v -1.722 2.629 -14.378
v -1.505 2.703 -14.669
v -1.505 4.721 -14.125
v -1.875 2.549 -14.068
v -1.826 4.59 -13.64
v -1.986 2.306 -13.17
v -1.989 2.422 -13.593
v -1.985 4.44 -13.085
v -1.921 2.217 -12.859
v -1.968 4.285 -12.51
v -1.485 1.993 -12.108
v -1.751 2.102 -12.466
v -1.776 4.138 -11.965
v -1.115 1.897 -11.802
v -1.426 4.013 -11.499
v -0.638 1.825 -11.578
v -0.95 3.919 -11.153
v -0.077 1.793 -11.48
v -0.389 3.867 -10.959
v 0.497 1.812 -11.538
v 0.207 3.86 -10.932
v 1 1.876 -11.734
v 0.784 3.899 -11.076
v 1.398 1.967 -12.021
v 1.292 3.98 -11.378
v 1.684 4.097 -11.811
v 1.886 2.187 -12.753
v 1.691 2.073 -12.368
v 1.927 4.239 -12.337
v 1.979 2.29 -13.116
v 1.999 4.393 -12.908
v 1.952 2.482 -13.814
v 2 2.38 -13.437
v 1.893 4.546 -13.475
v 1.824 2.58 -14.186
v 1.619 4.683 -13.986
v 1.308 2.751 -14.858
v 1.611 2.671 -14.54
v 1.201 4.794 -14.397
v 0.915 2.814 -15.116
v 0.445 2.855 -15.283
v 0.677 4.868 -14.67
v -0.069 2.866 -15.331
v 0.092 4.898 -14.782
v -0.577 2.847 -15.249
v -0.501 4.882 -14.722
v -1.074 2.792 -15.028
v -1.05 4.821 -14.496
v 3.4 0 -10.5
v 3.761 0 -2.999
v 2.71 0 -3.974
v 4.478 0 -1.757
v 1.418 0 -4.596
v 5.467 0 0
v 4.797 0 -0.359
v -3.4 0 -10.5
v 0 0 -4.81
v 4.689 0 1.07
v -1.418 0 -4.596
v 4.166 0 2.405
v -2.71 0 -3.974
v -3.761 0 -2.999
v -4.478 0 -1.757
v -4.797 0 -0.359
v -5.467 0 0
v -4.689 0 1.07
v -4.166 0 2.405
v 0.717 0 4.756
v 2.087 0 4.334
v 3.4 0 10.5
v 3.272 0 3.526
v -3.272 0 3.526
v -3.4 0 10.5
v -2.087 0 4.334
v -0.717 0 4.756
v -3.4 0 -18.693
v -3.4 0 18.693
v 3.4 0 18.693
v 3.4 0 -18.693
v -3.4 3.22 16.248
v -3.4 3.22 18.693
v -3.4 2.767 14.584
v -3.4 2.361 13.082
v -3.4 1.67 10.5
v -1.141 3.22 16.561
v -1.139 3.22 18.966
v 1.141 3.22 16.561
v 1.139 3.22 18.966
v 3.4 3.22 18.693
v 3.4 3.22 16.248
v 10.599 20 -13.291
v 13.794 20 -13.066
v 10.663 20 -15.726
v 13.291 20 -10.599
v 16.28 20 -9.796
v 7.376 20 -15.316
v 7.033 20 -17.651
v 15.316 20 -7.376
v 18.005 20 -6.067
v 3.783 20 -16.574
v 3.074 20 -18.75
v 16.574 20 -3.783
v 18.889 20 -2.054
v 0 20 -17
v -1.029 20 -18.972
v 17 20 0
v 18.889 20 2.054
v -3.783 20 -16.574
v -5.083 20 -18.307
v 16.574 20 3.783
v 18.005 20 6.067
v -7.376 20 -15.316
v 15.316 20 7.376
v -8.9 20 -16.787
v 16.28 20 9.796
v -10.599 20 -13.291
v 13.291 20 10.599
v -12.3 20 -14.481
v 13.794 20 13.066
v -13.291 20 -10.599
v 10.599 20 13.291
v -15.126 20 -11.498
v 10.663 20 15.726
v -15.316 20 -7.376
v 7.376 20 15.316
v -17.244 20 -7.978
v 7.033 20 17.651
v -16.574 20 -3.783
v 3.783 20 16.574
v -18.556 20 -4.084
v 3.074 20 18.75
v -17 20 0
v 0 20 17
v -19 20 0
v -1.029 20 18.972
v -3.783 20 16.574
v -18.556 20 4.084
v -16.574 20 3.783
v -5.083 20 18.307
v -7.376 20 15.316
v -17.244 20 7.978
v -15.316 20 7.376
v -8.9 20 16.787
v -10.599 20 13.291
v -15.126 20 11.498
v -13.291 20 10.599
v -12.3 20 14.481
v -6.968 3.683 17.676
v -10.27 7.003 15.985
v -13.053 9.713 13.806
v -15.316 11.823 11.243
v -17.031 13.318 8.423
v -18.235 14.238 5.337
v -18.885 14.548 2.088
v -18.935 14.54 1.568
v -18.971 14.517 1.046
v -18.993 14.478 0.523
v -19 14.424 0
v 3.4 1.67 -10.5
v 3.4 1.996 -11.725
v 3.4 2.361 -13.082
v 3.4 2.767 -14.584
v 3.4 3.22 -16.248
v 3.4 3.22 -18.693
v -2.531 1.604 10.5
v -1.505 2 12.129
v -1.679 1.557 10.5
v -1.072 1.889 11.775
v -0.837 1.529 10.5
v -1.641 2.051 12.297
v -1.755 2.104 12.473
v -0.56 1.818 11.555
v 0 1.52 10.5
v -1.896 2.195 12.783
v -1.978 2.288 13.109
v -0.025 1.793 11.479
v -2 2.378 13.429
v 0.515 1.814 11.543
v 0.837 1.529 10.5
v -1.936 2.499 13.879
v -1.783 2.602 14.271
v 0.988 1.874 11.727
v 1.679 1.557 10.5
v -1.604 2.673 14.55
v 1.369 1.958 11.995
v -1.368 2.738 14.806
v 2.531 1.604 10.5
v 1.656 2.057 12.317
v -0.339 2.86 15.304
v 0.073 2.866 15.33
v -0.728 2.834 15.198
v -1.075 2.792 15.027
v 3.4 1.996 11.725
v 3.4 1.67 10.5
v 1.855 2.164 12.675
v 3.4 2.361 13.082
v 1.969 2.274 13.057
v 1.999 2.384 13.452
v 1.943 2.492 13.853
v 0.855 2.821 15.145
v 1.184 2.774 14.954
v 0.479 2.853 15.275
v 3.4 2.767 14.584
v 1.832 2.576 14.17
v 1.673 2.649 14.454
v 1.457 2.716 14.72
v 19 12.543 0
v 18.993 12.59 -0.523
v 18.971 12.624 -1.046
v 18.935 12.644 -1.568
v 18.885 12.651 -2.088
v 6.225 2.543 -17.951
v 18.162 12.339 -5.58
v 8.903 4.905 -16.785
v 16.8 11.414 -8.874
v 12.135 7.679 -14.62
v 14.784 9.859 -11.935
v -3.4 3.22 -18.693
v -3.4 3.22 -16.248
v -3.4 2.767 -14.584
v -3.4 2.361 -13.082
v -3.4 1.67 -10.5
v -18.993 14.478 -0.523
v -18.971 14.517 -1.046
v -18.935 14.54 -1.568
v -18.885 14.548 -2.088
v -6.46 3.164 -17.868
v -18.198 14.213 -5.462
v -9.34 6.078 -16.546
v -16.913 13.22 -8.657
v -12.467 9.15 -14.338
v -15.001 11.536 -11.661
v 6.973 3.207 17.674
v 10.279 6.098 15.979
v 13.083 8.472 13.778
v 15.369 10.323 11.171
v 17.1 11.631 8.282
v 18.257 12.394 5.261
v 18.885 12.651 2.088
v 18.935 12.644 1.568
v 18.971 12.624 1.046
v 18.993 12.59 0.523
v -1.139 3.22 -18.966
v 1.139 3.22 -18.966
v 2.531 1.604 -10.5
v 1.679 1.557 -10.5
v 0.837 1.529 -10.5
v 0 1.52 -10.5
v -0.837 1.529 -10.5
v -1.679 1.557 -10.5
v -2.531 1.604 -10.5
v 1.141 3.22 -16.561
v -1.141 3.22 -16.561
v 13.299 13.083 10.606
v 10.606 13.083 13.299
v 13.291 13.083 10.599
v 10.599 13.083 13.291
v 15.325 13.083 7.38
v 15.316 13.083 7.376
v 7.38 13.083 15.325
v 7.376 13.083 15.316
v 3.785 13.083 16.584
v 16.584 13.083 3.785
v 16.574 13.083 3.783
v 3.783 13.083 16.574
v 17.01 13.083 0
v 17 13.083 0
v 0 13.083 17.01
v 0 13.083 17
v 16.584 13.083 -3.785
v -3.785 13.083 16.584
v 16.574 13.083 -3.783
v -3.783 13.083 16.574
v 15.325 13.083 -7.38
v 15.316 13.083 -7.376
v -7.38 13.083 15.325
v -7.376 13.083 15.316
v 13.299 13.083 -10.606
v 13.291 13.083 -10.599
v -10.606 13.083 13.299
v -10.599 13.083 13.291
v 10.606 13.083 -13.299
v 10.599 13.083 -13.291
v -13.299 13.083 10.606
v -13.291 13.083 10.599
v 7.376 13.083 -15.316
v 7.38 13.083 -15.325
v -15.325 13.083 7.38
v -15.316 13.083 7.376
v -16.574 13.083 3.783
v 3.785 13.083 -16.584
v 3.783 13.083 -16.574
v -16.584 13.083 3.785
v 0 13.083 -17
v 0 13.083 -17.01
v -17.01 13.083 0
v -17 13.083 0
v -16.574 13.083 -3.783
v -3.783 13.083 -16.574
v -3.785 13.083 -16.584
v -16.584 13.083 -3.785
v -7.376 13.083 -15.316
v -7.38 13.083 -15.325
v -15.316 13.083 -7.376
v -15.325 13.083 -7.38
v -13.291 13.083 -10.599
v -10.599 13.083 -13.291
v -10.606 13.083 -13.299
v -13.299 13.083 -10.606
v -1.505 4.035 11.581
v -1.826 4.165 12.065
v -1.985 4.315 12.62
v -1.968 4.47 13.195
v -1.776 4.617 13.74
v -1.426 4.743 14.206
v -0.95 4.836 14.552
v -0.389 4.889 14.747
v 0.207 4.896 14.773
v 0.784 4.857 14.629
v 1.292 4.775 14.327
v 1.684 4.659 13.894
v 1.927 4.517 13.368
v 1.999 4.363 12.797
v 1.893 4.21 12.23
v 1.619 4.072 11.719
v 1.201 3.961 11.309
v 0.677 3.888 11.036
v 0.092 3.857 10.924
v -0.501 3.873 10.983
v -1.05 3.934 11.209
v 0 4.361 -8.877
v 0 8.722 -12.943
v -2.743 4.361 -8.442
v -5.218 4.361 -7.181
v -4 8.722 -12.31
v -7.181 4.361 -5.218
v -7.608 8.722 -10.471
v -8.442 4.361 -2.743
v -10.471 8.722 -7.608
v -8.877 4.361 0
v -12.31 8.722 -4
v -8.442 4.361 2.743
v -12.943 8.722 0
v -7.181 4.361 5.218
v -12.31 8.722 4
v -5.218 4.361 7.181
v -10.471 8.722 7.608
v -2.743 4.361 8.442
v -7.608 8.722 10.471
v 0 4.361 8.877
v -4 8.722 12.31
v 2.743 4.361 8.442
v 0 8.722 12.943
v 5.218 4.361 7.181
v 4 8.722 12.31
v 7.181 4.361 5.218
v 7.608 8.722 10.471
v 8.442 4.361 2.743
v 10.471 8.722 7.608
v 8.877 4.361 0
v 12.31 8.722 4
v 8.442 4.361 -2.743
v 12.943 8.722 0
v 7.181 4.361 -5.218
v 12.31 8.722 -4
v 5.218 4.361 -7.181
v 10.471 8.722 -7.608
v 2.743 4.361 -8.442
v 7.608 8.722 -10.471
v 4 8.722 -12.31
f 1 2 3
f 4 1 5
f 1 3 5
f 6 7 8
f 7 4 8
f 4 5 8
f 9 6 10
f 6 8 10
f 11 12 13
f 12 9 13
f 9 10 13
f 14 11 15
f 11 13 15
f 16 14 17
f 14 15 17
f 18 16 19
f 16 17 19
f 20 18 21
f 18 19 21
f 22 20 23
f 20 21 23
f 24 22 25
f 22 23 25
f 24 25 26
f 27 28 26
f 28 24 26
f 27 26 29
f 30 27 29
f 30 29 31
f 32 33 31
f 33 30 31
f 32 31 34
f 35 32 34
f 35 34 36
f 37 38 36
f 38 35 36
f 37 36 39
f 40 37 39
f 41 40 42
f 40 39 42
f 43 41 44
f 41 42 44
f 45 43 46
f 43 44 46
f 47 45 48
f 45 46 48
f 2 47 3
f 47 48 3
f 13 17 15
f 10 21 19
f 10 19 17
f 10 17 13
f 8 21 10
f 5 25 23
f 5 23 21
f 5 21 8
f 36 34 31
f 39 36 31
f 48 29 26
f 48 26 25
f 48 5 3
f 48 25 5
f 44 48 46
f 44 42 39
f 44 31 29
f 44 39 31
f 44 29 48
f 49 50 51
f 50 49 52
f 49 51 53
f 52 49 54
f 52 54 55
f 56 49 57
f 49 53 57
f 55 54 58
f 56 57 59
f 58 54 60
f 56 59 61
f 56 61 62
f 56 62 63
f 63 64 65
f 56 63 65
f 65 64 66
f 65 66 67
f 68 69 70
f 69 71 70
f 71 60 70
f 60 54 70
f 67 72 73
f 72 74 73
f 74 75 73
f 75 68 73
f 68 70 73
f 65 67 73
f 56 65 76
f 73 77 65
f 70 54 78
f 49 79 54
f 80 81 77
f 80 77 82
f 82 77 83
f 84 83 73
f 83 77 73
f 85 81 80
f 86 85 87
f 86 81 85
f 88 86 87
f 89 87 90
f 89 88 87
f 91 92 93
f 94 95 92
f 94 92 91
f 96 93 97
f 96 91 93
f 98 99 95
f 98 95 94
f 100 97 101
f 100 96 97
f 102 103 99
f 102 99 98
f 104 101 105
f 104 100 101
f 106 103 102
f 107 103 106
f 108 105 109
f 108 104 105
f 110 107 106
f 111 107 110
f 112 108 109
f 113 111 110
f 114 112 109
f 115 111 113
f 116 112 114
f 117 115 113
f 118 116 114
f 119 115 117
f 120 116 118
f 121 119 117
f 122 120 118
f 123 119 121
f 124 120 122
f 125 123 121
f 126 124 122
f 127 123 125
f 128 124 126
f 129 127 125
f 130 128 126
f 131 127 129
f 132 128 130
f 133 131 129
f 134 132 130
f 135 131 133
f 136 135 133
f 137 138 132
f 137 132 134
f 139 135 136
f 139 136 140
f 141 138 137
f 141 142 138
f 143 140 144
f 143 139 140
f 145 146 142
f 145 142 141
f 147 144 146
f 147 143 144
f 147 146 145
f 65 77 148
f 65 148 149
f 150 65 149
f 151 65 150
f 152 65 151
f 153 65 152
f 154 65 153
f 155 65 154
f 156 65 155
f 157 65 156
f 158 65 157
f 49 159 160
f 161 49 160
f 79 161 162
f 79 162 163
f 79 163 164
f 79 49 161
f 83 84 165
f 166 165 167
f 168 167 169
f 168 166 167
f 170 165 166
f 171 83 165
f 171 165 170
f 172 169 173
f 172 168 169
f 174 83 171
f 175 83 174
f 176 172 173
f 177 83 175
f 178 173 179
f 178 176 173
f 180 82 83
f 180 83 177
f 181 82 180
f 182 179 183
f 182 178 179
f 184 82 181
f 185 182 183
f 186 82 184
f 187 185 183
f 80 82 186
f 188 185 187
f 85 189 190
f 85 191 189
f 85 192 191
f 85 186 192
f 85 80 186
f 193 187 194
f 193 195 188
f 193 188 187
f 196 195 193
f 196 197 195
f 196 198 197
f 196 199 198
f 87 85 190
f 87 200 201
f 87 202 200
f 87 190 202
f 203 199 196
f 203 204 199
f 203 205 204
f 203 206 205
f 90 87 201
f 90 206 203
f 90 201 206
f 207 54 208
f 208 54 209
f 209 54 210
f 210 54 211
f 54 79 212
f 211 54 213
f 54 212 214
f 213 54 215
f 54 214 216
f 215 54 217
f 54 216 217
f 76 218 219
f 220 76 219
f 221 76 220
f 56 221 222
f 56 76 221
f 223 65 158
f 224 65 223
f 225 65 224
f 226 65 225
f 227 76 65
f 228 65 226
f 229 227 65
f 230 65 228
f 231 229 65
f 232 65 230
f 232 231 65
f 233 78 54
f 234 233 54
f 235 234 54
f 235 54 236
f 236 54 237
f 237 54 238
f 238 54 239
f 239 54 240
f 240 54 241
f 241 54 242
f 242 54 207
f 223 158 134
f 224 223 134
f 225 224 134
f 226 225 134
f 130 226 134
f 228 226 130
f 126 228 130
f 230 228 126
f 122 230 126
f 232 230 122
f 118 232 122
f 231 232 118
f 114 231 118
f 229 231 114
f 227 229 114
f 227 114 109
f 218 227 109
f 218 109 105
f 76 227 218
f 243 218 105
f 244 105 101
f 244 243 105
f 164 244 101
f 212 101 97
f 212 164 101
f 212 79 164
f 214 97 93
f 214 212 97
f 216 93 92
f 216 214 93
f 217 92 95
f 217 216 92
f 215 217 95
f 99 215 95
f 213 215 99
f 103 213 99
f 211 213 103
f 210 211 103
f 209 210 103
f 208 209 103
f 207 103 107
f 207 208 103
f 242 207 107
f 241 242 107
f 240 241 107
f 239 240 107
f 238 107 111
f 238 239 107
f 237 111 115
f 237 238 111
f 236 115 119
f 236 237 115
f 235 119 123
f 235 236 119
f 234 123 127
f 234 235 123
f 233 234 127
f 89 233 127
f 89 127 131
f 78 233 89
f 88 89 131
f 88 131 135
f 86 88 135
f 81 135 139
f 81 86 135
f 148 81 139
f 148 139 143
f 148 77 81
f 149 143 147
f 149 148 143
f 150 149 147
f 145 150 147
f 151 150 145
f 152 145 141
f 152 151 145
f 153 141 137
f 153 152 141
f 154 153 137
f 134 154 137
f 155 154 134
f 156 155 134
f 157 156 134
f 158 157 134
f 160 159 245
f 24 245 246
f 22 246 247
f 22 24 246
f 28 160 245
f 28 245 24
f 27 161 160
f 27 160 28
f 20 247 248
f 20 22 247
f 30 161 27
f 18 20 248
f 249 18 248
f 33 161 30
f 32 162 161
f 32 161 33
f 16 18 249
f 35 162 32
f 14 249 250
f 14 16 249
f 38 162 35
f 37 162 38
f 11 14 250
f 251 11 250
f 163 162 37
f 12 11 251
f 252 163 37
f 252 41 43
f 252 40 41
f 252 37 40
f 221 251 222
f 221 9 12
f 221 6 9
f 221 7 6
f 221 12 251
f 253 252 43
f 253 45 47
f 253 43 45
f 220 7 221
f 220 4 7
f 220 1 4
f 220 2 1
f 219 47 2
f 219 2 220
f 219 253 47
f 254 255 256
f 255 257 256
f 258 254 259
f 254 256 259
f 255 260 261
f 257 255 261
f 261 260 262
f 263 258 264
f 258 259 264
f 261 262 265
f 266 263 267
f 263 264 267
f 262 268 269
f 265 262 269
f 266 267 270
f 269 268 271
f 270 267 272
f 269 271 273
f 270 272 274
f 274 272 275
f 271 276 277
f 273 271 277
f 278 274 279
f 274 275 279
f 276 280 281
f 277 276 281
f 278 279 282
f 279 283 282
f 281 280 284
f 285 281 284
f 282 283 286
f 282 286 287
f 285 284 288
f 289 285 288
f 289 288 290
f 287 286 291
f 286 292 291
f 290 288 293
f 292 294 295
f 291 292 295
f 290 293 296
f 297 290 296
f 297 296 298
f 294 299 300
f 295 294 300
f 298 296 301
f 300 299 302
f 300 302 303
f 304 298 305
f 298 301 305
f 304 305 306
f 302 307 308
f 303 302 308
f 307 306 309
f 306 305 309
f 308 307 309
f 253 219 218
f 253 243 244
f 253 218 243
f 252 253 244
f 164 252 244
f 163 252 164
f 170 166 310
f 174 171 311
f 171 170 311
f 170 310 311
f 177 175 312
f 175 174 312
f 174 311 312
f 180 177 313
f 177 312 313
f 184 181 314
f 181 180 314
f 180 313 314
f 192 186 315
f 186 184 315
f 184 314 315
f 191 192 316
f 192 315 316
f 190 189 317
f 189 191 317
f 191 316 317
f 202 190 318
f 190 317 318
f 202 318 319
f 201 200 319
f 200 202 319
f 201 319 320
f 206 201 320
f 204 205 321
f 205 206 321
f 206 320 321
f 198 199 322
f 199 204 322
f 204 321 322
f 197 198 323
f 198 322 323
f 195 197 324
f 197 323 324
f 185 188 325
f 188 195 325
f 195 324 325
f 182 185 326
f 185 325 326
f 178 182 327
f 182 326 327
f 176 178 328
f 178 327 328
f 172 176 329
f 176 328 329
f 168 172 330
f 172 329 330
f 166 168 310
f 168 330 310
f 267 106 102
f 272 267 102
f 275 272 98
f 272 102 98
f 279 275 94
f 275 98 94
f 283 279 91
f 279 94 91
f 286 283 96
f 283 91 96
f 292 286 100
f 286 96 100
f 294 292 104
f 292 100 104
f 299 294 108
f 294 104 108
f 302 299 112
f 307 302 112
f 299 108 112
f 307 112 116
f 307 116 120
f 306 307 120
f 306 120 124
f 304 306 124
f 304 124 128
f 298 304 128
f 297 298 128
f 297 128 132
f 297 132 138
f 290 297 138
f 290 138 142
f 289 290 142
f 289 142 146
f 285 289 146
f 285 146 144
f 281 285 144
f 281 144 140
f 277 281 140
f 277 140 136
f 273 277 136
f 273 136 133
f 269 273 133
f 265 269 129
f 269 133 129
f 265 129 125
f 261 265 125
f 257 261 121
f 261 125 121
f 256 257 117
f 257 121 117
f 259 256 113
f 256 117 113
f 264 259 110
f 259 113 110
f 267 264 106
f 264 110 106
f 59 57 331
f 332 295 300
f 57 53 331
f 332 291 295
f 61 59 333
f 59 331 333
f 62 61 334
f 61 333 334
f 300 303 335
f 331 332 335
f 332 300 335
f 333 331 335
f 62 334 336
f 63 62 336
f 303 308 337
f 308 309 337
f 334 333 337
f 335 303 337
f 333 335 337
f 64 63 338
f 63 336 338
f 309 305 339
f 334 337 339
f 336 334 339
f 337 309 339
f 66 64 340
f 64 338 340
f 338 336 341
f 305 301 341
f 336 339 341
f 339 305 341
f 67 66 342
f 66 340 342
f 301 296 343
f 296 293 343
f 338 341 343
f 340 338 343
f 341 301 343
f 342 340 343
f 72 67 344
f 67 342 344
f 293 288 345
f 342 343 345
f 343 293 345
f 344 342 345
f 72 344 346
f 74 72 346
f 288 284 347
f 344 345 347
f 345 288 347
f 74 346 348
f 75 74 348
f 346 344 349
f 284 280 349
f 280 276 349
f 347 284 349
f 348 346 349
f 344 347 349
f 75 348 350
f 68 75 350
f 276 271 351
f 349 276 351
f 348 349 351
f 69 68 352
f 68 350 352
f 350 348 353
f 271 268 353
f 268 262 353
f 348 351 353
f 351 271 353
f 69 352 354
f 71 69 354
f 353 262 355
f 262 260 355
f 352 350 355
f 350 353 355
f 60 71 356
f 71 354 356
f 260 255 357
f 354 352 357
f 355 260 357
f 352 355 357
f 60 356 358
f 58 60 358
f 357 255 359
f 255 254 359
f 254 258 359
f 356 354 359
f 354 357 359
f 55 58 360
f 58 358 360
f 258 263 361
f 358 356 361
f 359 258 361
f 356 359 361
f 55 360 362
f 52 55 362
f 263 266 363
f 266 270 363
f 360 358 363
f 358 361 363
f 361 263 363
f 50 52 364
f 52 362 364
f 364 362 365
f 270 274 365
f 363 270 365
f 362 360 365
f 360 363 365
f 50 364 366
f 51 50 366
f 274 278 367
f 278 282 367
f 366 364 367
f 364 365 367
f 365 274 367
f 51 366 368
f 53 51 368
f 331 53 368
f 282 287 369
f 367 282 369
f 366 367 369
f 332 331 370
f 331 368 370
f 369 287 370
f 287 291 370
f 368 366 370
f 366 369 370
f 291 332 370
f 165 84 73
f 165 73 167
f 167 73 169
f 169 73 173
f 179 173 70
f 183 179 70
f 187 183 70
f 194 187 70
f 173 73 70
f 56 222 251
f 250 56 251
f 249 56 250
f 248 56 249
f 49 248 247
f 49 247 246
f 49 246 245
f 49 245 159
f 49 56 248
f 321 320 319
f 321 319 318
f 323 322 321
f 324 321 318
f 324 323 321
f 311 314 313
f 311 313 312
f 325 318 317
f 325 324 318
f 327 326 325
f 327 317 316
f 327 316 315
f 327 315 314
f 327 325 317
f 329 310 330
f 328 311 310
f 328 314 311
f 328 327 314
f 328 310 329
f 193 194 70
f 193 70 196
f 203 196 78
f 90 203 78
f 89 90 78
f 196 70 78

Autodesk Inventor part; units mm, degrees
ref_plane "YZ Plane" through (0, 0, 0) normal (1, 0, 0) x (0, 1, 0)
sketch "Sketch1" plane through (0, 0, 0) normal (0, 1, 0) x (-1, 0, 0)
  circle A0 centre (0, 0) radius 19
  dimension "d0" = 38
extrude "Extrusion1" add sketch "Sketch1" along normal blind 20
sketch "Sketch2" plane through (0, 0, 0) normal (0, -1, 0) x (1, 0, 0)
  line L0 (0, -10.5) -> (3.4, -10.5)
  line L1 (3.4, -10.5) -> (3.4, -19)
  line L2 (3.4, -19) -> (0, -19)
  line L3 (0, -19) -> (-3.4, -19)
  line L4 (-3.4, -19) -> (-3.4, -10.5)
  line L5 (-3.4, -10.5) -> (0, -10.5)
  point P0 (0, 0)
  dimension "d3" = 10.5
  dimension "d5" = 8.5
  dimension "d113" = 3.4
  dimension "d114" = 3.4
sketch "Sketch3" plane through (0, 0, 0) normal (0, -1, 0) x (1, 0, 0)
  line L0 (0.251, 10.5) -> (3.4, 10.5)
  line L1 (3.4, 10.5) -> (3.4, 19)
  line L2 (3.4, 19) -> (-0.351, 19)
  line L3 (-0.351, 19) -> (-3.4, 19)
  line L4 (-3.4, 19) -> (-3.4, 10.5)
  line L5 (-3.4, 10.5) -> (0.251, 10.5)
  point P0 (0, 0)
  dimension "d22" = 8.5
  dimension "d106" = 10.5
  dimension "d107" = 3.4
  dimension "d110" = 3.4
extrude "Extrusion2" cut sketch "Sketch3" against normal blind 3.22
extrude "Extrusion3" cut sketch "Sketch2" against normal blind 3.22
sketch "Sketch4" plane through (0, 0, 0) normal (1, 0, 0) x (0, 1, 0)
  line L0 (0, -10.5) -> (3.22, -10.5) projected
  line L1 (3.22, -10.5) -> (3.22, -16.6)
  line L2 (3.22, -10.5) -> (3.22, -18.6933) projected
  line L3 (3.22, -16.6) -> (3.22, -10.5)
  line L4 (3.22, -10.5) -> (1.52, -10.5)
  line L5 (1.52, -10.5) -> (3.22, -16.6)
  line L6 (-0.644, 0) -> (3.864, 0) projected
  point P0 (0, 0)
  dimension "d28" = 6.1
  dimension "d29" = 1.7
revolve "Revolution1" add sketch "Sketch4" angle 360 about axis through (0, -10, 0) along (0, 1, 0)
sketch "Sketch5" plane through (0, 20, 0) normal (0, 1, 0) x (1, 0, 0)
  circle A0 centre (0, 0) radius 4.81
  dimension "d31" = 9.62
extrude "Extrusion4" cut sketch "Sketch5" against normal through all
sketch "Sketch6" plane through (0, 0, 0) normal (1, 0, 0) x (0, 1, 0)
  line L0 (0, -4.81) -> (13.0829, -17.01)
  line L1 (20, -19) -> (20, 19) projected
  line L2 (13.0829, -4.81) -> (0, -4.81)
  line L3 (-2.6166, 0) -> (15.6995, 0) projected
  line L4 (13.0829, -4.81) -> (13.0829, -17.01)
  line L5 (3.22, -19) -> (20, -19) projected
  line L6 (0, -4.81) -> (13.0829, -4.81) construction
  point P0 (0, 0)
  point P1 (20, -4.81)
  point P2 (13.0829, -17.01)
  dimension "d85" = 12.2
  dimension "d90" = 13.0829
revolve "Revolution2" cut sketch "Sketch6" angle 360 about axis through (0, -10, 0) along (0, 1, 0)
ref_plane "Work Plane1" through (3.4, 3.22, 16.2481) normal (0, -0.9654954, 0.2604203) x (-0.7523847, -0.1715451, -0.6359949)
sketch "Sketch10" plane through (3.4, 3.22, 16.2481) normal (0, -0.9654954, 0.2604203) x (-0.7523847, -0.1715451, -0.6359949)
  line L0 (9.3243, 0.3271) -> (9.0379, 0) projected
  line L1 (-1.5552, -1.7763) -> (0, 0) projected
  line L2 (9.0379, 0) -> (0, 0)
  circle A0 centre (4.519, 0) radius 2
  point P0 (13.4442, 10.1942)
  dimension "d111" = 4
extrude "Extrusion5" cut sketch "Sketch10" along normal mid plane 4
ref_plane "Work Plane4" through (3.4, 1.6696, -10.5) normal (0, -0.9654954, -0.2604203) x (-0.7523847, 0.1715451, -0.6359949)
sketch "Sketch12" plane through (3.4, 1.6696, -10.5) normal (0, -0.9654954, -0.2604203) x (-0.7523847, 0.1715451, -0.6359949)
  line L0 (-0.2864, -0.3271) -> (0, 0) projected
  ellipse E0 centre (-3.8539, -9.5633) end of major axis (8.6357, -20.4981) minor radius 16.0272 (9.0379, 0) -> (3.9217, 4.4793) ccw projected
  line L1 (0, 0) -> (3.9217, 4.4793)
  line L2 (4.8298, -4.8065) -> (5.1162, -4.4793) projected
  line L3 (5.1162, -4.4793) -> (3.9217, 4.4793)
  line L4 (10.5931, 1.7763) -> (9.0379, 0) projected
  line L5 (9.0379, 0) -> (0, 0)
  circle A0 centre (4.519, 0) radius 2
  point P0 (-4.4062, -10.1942)
  point P1 (4.519, 0)
  dimension "d116" = 4
extrude "Extrusion6" cut sketch "Sketch12" along normal mid plane 4 contours A0 L3 L5 | L5 L3 A0 | L3 L5 A0 | L3 A0 L5
sketch "Sketch18" plane through (0, 0, 0) normal (0.1099078, 0, 0.9939418) x (0.9939418, 0, -0.1099078)
  line L0 (19, 20) -> (-19, 20) projected
  line L1 (19, 0) -> (5.4339, 0)
  line L2 (4.5334, 0) -> (5.4339, 0) projected
  line L3 (5.4339, 0) -> (19, 12.6506)
  line L4 (19, 0) -> (19, 20) projected
  line L5 (5.4339, 0) -> (23.9832, 0) construction
  line L6 (1.3249, 0) -> (19, 0) projected
  line L7 (19, 12.6506) -> (19, 0)
  line L8 (19, 0) -> (19, 20) projected
  line L9 (19, 0) -> (5.4339, 0)
  point P0 (0, 0)
  point P1 (24.4257, 20)
  dimension "d91" = 43
sketch "Sketch20" plane through (0, 0, 0) normal (-0.1099078, 0, 0.9939418) x (0.9939418, 0, 0.1099078)
  line L0 (5.4339, 3.22) -> (5.4339, 0) projected
  line L1 (5.4339, 0) -> (19, 12.6506)
  line L2 (19, 0) -> (19, 20) projected
  line L3 (5.4339, 0) -> (23.9832, 0) construction
  line L4 (1.3249, 0) -> (19, 0) projected
  line L5 (19, 12.6506) -> (19, 0)
  line L6 (5.4339, 0) -> (4.5334, 0) projected
  line L7 (19, 0) -> (5.4339, 0)
  point P0 (0, 0)
  point P1 (10.438, 5)
  point P2 (-18.8849, 20)
  point P3 (-18.8849, 20)
  dimension "d94" = 43
sketch "Sketch21" plane through (0, 0, 0) normal (-0.1099078, 0, 0.9939418) x (0.9939418, 0, 0.1099078)
  point P0 (0, 0)
sketch "Sketch22" plane through (0, 0, 0) normal (-0.1099078, 0, 0.9939418) x (0.9939418, 0, 0.1099078)
  line L0 (-18.8849, 20) -> (-19, 20) projected
  line L1 (-5.4339, 0) -> (21.9126, 0) construction
  line L2 (-5.4339, 0) -> (-4.5334, 0) projected
  line L3 (-5.4339, 0) -> (-19, 14.5478)
  line L4 (-19, 0) -> (-19, 20) projected
  line L5 (-5.4339, 0) -> (14.4577, 0) construction
  line L6 (-19, 0) -> (-1.3249, 0) projected
  line L7 (-19, 14.5478) -> (-19, 0)
  line L8 (-19, 0) -> (-5.4339, 0)
  point P0 (0, 0)
  dimension "d97" = 133
sketch "Sketch23" plane through (0, 0, 0) normal (0.1099078, 0, 0.9939418) x (0.9939418, 0, -0.1099078)
  line L0 (-9.5907, 0) -> (-1.3249, 0) projected
  line L1 (-5.6359, 0) -> (1.2007, 0) construction
  line L2 (-4.5334, 0) -> (-5.4339, 0) projected
  line L3 (-5.4339, 0) -> (-19, 14.5478)
  line L4 (-19, 0) -> (-19, 20) projected
  line L5 (-5.4339, 0) -> (14.4577, 0) construction
  line L6 (-19, 0) -> (-1.3249, 0) projected
  line L7 (-19, 14.5478) -> (-19, 0)
  line L8 (-19, 0) -> (-5.4339, 0)
  point P0 (0, 0)
  point P1 (-18.8849, 20)
  point P2 (-18.8849, 20)
  dimension "d100" = 133
extrude "Extrusion13" cut sketch "Sketch18" along normal through all both and the other way through all
extrude "Extrusion14" cut sketch "Sketch20" along normal through all both and the other way through all
extrude "Extrusion15" cut sketch "Sketch22" along normal through all both and the other way through all
extrude "Extrusion16" cut sketch "Sketch23" along normal through all both and the other way through all
sketch "Sketch25" plane through (0, 20, 0) normal (0, 1, 0) x (1, 0, 0)
  circle A0 centre (0, 0) radius 17
  dimension "d103" = 34
extrude "Extrusion17" cut sketch "Sketch25" against normal blind 6.92
properties part number "LightShieldBottom" material "Glass"
